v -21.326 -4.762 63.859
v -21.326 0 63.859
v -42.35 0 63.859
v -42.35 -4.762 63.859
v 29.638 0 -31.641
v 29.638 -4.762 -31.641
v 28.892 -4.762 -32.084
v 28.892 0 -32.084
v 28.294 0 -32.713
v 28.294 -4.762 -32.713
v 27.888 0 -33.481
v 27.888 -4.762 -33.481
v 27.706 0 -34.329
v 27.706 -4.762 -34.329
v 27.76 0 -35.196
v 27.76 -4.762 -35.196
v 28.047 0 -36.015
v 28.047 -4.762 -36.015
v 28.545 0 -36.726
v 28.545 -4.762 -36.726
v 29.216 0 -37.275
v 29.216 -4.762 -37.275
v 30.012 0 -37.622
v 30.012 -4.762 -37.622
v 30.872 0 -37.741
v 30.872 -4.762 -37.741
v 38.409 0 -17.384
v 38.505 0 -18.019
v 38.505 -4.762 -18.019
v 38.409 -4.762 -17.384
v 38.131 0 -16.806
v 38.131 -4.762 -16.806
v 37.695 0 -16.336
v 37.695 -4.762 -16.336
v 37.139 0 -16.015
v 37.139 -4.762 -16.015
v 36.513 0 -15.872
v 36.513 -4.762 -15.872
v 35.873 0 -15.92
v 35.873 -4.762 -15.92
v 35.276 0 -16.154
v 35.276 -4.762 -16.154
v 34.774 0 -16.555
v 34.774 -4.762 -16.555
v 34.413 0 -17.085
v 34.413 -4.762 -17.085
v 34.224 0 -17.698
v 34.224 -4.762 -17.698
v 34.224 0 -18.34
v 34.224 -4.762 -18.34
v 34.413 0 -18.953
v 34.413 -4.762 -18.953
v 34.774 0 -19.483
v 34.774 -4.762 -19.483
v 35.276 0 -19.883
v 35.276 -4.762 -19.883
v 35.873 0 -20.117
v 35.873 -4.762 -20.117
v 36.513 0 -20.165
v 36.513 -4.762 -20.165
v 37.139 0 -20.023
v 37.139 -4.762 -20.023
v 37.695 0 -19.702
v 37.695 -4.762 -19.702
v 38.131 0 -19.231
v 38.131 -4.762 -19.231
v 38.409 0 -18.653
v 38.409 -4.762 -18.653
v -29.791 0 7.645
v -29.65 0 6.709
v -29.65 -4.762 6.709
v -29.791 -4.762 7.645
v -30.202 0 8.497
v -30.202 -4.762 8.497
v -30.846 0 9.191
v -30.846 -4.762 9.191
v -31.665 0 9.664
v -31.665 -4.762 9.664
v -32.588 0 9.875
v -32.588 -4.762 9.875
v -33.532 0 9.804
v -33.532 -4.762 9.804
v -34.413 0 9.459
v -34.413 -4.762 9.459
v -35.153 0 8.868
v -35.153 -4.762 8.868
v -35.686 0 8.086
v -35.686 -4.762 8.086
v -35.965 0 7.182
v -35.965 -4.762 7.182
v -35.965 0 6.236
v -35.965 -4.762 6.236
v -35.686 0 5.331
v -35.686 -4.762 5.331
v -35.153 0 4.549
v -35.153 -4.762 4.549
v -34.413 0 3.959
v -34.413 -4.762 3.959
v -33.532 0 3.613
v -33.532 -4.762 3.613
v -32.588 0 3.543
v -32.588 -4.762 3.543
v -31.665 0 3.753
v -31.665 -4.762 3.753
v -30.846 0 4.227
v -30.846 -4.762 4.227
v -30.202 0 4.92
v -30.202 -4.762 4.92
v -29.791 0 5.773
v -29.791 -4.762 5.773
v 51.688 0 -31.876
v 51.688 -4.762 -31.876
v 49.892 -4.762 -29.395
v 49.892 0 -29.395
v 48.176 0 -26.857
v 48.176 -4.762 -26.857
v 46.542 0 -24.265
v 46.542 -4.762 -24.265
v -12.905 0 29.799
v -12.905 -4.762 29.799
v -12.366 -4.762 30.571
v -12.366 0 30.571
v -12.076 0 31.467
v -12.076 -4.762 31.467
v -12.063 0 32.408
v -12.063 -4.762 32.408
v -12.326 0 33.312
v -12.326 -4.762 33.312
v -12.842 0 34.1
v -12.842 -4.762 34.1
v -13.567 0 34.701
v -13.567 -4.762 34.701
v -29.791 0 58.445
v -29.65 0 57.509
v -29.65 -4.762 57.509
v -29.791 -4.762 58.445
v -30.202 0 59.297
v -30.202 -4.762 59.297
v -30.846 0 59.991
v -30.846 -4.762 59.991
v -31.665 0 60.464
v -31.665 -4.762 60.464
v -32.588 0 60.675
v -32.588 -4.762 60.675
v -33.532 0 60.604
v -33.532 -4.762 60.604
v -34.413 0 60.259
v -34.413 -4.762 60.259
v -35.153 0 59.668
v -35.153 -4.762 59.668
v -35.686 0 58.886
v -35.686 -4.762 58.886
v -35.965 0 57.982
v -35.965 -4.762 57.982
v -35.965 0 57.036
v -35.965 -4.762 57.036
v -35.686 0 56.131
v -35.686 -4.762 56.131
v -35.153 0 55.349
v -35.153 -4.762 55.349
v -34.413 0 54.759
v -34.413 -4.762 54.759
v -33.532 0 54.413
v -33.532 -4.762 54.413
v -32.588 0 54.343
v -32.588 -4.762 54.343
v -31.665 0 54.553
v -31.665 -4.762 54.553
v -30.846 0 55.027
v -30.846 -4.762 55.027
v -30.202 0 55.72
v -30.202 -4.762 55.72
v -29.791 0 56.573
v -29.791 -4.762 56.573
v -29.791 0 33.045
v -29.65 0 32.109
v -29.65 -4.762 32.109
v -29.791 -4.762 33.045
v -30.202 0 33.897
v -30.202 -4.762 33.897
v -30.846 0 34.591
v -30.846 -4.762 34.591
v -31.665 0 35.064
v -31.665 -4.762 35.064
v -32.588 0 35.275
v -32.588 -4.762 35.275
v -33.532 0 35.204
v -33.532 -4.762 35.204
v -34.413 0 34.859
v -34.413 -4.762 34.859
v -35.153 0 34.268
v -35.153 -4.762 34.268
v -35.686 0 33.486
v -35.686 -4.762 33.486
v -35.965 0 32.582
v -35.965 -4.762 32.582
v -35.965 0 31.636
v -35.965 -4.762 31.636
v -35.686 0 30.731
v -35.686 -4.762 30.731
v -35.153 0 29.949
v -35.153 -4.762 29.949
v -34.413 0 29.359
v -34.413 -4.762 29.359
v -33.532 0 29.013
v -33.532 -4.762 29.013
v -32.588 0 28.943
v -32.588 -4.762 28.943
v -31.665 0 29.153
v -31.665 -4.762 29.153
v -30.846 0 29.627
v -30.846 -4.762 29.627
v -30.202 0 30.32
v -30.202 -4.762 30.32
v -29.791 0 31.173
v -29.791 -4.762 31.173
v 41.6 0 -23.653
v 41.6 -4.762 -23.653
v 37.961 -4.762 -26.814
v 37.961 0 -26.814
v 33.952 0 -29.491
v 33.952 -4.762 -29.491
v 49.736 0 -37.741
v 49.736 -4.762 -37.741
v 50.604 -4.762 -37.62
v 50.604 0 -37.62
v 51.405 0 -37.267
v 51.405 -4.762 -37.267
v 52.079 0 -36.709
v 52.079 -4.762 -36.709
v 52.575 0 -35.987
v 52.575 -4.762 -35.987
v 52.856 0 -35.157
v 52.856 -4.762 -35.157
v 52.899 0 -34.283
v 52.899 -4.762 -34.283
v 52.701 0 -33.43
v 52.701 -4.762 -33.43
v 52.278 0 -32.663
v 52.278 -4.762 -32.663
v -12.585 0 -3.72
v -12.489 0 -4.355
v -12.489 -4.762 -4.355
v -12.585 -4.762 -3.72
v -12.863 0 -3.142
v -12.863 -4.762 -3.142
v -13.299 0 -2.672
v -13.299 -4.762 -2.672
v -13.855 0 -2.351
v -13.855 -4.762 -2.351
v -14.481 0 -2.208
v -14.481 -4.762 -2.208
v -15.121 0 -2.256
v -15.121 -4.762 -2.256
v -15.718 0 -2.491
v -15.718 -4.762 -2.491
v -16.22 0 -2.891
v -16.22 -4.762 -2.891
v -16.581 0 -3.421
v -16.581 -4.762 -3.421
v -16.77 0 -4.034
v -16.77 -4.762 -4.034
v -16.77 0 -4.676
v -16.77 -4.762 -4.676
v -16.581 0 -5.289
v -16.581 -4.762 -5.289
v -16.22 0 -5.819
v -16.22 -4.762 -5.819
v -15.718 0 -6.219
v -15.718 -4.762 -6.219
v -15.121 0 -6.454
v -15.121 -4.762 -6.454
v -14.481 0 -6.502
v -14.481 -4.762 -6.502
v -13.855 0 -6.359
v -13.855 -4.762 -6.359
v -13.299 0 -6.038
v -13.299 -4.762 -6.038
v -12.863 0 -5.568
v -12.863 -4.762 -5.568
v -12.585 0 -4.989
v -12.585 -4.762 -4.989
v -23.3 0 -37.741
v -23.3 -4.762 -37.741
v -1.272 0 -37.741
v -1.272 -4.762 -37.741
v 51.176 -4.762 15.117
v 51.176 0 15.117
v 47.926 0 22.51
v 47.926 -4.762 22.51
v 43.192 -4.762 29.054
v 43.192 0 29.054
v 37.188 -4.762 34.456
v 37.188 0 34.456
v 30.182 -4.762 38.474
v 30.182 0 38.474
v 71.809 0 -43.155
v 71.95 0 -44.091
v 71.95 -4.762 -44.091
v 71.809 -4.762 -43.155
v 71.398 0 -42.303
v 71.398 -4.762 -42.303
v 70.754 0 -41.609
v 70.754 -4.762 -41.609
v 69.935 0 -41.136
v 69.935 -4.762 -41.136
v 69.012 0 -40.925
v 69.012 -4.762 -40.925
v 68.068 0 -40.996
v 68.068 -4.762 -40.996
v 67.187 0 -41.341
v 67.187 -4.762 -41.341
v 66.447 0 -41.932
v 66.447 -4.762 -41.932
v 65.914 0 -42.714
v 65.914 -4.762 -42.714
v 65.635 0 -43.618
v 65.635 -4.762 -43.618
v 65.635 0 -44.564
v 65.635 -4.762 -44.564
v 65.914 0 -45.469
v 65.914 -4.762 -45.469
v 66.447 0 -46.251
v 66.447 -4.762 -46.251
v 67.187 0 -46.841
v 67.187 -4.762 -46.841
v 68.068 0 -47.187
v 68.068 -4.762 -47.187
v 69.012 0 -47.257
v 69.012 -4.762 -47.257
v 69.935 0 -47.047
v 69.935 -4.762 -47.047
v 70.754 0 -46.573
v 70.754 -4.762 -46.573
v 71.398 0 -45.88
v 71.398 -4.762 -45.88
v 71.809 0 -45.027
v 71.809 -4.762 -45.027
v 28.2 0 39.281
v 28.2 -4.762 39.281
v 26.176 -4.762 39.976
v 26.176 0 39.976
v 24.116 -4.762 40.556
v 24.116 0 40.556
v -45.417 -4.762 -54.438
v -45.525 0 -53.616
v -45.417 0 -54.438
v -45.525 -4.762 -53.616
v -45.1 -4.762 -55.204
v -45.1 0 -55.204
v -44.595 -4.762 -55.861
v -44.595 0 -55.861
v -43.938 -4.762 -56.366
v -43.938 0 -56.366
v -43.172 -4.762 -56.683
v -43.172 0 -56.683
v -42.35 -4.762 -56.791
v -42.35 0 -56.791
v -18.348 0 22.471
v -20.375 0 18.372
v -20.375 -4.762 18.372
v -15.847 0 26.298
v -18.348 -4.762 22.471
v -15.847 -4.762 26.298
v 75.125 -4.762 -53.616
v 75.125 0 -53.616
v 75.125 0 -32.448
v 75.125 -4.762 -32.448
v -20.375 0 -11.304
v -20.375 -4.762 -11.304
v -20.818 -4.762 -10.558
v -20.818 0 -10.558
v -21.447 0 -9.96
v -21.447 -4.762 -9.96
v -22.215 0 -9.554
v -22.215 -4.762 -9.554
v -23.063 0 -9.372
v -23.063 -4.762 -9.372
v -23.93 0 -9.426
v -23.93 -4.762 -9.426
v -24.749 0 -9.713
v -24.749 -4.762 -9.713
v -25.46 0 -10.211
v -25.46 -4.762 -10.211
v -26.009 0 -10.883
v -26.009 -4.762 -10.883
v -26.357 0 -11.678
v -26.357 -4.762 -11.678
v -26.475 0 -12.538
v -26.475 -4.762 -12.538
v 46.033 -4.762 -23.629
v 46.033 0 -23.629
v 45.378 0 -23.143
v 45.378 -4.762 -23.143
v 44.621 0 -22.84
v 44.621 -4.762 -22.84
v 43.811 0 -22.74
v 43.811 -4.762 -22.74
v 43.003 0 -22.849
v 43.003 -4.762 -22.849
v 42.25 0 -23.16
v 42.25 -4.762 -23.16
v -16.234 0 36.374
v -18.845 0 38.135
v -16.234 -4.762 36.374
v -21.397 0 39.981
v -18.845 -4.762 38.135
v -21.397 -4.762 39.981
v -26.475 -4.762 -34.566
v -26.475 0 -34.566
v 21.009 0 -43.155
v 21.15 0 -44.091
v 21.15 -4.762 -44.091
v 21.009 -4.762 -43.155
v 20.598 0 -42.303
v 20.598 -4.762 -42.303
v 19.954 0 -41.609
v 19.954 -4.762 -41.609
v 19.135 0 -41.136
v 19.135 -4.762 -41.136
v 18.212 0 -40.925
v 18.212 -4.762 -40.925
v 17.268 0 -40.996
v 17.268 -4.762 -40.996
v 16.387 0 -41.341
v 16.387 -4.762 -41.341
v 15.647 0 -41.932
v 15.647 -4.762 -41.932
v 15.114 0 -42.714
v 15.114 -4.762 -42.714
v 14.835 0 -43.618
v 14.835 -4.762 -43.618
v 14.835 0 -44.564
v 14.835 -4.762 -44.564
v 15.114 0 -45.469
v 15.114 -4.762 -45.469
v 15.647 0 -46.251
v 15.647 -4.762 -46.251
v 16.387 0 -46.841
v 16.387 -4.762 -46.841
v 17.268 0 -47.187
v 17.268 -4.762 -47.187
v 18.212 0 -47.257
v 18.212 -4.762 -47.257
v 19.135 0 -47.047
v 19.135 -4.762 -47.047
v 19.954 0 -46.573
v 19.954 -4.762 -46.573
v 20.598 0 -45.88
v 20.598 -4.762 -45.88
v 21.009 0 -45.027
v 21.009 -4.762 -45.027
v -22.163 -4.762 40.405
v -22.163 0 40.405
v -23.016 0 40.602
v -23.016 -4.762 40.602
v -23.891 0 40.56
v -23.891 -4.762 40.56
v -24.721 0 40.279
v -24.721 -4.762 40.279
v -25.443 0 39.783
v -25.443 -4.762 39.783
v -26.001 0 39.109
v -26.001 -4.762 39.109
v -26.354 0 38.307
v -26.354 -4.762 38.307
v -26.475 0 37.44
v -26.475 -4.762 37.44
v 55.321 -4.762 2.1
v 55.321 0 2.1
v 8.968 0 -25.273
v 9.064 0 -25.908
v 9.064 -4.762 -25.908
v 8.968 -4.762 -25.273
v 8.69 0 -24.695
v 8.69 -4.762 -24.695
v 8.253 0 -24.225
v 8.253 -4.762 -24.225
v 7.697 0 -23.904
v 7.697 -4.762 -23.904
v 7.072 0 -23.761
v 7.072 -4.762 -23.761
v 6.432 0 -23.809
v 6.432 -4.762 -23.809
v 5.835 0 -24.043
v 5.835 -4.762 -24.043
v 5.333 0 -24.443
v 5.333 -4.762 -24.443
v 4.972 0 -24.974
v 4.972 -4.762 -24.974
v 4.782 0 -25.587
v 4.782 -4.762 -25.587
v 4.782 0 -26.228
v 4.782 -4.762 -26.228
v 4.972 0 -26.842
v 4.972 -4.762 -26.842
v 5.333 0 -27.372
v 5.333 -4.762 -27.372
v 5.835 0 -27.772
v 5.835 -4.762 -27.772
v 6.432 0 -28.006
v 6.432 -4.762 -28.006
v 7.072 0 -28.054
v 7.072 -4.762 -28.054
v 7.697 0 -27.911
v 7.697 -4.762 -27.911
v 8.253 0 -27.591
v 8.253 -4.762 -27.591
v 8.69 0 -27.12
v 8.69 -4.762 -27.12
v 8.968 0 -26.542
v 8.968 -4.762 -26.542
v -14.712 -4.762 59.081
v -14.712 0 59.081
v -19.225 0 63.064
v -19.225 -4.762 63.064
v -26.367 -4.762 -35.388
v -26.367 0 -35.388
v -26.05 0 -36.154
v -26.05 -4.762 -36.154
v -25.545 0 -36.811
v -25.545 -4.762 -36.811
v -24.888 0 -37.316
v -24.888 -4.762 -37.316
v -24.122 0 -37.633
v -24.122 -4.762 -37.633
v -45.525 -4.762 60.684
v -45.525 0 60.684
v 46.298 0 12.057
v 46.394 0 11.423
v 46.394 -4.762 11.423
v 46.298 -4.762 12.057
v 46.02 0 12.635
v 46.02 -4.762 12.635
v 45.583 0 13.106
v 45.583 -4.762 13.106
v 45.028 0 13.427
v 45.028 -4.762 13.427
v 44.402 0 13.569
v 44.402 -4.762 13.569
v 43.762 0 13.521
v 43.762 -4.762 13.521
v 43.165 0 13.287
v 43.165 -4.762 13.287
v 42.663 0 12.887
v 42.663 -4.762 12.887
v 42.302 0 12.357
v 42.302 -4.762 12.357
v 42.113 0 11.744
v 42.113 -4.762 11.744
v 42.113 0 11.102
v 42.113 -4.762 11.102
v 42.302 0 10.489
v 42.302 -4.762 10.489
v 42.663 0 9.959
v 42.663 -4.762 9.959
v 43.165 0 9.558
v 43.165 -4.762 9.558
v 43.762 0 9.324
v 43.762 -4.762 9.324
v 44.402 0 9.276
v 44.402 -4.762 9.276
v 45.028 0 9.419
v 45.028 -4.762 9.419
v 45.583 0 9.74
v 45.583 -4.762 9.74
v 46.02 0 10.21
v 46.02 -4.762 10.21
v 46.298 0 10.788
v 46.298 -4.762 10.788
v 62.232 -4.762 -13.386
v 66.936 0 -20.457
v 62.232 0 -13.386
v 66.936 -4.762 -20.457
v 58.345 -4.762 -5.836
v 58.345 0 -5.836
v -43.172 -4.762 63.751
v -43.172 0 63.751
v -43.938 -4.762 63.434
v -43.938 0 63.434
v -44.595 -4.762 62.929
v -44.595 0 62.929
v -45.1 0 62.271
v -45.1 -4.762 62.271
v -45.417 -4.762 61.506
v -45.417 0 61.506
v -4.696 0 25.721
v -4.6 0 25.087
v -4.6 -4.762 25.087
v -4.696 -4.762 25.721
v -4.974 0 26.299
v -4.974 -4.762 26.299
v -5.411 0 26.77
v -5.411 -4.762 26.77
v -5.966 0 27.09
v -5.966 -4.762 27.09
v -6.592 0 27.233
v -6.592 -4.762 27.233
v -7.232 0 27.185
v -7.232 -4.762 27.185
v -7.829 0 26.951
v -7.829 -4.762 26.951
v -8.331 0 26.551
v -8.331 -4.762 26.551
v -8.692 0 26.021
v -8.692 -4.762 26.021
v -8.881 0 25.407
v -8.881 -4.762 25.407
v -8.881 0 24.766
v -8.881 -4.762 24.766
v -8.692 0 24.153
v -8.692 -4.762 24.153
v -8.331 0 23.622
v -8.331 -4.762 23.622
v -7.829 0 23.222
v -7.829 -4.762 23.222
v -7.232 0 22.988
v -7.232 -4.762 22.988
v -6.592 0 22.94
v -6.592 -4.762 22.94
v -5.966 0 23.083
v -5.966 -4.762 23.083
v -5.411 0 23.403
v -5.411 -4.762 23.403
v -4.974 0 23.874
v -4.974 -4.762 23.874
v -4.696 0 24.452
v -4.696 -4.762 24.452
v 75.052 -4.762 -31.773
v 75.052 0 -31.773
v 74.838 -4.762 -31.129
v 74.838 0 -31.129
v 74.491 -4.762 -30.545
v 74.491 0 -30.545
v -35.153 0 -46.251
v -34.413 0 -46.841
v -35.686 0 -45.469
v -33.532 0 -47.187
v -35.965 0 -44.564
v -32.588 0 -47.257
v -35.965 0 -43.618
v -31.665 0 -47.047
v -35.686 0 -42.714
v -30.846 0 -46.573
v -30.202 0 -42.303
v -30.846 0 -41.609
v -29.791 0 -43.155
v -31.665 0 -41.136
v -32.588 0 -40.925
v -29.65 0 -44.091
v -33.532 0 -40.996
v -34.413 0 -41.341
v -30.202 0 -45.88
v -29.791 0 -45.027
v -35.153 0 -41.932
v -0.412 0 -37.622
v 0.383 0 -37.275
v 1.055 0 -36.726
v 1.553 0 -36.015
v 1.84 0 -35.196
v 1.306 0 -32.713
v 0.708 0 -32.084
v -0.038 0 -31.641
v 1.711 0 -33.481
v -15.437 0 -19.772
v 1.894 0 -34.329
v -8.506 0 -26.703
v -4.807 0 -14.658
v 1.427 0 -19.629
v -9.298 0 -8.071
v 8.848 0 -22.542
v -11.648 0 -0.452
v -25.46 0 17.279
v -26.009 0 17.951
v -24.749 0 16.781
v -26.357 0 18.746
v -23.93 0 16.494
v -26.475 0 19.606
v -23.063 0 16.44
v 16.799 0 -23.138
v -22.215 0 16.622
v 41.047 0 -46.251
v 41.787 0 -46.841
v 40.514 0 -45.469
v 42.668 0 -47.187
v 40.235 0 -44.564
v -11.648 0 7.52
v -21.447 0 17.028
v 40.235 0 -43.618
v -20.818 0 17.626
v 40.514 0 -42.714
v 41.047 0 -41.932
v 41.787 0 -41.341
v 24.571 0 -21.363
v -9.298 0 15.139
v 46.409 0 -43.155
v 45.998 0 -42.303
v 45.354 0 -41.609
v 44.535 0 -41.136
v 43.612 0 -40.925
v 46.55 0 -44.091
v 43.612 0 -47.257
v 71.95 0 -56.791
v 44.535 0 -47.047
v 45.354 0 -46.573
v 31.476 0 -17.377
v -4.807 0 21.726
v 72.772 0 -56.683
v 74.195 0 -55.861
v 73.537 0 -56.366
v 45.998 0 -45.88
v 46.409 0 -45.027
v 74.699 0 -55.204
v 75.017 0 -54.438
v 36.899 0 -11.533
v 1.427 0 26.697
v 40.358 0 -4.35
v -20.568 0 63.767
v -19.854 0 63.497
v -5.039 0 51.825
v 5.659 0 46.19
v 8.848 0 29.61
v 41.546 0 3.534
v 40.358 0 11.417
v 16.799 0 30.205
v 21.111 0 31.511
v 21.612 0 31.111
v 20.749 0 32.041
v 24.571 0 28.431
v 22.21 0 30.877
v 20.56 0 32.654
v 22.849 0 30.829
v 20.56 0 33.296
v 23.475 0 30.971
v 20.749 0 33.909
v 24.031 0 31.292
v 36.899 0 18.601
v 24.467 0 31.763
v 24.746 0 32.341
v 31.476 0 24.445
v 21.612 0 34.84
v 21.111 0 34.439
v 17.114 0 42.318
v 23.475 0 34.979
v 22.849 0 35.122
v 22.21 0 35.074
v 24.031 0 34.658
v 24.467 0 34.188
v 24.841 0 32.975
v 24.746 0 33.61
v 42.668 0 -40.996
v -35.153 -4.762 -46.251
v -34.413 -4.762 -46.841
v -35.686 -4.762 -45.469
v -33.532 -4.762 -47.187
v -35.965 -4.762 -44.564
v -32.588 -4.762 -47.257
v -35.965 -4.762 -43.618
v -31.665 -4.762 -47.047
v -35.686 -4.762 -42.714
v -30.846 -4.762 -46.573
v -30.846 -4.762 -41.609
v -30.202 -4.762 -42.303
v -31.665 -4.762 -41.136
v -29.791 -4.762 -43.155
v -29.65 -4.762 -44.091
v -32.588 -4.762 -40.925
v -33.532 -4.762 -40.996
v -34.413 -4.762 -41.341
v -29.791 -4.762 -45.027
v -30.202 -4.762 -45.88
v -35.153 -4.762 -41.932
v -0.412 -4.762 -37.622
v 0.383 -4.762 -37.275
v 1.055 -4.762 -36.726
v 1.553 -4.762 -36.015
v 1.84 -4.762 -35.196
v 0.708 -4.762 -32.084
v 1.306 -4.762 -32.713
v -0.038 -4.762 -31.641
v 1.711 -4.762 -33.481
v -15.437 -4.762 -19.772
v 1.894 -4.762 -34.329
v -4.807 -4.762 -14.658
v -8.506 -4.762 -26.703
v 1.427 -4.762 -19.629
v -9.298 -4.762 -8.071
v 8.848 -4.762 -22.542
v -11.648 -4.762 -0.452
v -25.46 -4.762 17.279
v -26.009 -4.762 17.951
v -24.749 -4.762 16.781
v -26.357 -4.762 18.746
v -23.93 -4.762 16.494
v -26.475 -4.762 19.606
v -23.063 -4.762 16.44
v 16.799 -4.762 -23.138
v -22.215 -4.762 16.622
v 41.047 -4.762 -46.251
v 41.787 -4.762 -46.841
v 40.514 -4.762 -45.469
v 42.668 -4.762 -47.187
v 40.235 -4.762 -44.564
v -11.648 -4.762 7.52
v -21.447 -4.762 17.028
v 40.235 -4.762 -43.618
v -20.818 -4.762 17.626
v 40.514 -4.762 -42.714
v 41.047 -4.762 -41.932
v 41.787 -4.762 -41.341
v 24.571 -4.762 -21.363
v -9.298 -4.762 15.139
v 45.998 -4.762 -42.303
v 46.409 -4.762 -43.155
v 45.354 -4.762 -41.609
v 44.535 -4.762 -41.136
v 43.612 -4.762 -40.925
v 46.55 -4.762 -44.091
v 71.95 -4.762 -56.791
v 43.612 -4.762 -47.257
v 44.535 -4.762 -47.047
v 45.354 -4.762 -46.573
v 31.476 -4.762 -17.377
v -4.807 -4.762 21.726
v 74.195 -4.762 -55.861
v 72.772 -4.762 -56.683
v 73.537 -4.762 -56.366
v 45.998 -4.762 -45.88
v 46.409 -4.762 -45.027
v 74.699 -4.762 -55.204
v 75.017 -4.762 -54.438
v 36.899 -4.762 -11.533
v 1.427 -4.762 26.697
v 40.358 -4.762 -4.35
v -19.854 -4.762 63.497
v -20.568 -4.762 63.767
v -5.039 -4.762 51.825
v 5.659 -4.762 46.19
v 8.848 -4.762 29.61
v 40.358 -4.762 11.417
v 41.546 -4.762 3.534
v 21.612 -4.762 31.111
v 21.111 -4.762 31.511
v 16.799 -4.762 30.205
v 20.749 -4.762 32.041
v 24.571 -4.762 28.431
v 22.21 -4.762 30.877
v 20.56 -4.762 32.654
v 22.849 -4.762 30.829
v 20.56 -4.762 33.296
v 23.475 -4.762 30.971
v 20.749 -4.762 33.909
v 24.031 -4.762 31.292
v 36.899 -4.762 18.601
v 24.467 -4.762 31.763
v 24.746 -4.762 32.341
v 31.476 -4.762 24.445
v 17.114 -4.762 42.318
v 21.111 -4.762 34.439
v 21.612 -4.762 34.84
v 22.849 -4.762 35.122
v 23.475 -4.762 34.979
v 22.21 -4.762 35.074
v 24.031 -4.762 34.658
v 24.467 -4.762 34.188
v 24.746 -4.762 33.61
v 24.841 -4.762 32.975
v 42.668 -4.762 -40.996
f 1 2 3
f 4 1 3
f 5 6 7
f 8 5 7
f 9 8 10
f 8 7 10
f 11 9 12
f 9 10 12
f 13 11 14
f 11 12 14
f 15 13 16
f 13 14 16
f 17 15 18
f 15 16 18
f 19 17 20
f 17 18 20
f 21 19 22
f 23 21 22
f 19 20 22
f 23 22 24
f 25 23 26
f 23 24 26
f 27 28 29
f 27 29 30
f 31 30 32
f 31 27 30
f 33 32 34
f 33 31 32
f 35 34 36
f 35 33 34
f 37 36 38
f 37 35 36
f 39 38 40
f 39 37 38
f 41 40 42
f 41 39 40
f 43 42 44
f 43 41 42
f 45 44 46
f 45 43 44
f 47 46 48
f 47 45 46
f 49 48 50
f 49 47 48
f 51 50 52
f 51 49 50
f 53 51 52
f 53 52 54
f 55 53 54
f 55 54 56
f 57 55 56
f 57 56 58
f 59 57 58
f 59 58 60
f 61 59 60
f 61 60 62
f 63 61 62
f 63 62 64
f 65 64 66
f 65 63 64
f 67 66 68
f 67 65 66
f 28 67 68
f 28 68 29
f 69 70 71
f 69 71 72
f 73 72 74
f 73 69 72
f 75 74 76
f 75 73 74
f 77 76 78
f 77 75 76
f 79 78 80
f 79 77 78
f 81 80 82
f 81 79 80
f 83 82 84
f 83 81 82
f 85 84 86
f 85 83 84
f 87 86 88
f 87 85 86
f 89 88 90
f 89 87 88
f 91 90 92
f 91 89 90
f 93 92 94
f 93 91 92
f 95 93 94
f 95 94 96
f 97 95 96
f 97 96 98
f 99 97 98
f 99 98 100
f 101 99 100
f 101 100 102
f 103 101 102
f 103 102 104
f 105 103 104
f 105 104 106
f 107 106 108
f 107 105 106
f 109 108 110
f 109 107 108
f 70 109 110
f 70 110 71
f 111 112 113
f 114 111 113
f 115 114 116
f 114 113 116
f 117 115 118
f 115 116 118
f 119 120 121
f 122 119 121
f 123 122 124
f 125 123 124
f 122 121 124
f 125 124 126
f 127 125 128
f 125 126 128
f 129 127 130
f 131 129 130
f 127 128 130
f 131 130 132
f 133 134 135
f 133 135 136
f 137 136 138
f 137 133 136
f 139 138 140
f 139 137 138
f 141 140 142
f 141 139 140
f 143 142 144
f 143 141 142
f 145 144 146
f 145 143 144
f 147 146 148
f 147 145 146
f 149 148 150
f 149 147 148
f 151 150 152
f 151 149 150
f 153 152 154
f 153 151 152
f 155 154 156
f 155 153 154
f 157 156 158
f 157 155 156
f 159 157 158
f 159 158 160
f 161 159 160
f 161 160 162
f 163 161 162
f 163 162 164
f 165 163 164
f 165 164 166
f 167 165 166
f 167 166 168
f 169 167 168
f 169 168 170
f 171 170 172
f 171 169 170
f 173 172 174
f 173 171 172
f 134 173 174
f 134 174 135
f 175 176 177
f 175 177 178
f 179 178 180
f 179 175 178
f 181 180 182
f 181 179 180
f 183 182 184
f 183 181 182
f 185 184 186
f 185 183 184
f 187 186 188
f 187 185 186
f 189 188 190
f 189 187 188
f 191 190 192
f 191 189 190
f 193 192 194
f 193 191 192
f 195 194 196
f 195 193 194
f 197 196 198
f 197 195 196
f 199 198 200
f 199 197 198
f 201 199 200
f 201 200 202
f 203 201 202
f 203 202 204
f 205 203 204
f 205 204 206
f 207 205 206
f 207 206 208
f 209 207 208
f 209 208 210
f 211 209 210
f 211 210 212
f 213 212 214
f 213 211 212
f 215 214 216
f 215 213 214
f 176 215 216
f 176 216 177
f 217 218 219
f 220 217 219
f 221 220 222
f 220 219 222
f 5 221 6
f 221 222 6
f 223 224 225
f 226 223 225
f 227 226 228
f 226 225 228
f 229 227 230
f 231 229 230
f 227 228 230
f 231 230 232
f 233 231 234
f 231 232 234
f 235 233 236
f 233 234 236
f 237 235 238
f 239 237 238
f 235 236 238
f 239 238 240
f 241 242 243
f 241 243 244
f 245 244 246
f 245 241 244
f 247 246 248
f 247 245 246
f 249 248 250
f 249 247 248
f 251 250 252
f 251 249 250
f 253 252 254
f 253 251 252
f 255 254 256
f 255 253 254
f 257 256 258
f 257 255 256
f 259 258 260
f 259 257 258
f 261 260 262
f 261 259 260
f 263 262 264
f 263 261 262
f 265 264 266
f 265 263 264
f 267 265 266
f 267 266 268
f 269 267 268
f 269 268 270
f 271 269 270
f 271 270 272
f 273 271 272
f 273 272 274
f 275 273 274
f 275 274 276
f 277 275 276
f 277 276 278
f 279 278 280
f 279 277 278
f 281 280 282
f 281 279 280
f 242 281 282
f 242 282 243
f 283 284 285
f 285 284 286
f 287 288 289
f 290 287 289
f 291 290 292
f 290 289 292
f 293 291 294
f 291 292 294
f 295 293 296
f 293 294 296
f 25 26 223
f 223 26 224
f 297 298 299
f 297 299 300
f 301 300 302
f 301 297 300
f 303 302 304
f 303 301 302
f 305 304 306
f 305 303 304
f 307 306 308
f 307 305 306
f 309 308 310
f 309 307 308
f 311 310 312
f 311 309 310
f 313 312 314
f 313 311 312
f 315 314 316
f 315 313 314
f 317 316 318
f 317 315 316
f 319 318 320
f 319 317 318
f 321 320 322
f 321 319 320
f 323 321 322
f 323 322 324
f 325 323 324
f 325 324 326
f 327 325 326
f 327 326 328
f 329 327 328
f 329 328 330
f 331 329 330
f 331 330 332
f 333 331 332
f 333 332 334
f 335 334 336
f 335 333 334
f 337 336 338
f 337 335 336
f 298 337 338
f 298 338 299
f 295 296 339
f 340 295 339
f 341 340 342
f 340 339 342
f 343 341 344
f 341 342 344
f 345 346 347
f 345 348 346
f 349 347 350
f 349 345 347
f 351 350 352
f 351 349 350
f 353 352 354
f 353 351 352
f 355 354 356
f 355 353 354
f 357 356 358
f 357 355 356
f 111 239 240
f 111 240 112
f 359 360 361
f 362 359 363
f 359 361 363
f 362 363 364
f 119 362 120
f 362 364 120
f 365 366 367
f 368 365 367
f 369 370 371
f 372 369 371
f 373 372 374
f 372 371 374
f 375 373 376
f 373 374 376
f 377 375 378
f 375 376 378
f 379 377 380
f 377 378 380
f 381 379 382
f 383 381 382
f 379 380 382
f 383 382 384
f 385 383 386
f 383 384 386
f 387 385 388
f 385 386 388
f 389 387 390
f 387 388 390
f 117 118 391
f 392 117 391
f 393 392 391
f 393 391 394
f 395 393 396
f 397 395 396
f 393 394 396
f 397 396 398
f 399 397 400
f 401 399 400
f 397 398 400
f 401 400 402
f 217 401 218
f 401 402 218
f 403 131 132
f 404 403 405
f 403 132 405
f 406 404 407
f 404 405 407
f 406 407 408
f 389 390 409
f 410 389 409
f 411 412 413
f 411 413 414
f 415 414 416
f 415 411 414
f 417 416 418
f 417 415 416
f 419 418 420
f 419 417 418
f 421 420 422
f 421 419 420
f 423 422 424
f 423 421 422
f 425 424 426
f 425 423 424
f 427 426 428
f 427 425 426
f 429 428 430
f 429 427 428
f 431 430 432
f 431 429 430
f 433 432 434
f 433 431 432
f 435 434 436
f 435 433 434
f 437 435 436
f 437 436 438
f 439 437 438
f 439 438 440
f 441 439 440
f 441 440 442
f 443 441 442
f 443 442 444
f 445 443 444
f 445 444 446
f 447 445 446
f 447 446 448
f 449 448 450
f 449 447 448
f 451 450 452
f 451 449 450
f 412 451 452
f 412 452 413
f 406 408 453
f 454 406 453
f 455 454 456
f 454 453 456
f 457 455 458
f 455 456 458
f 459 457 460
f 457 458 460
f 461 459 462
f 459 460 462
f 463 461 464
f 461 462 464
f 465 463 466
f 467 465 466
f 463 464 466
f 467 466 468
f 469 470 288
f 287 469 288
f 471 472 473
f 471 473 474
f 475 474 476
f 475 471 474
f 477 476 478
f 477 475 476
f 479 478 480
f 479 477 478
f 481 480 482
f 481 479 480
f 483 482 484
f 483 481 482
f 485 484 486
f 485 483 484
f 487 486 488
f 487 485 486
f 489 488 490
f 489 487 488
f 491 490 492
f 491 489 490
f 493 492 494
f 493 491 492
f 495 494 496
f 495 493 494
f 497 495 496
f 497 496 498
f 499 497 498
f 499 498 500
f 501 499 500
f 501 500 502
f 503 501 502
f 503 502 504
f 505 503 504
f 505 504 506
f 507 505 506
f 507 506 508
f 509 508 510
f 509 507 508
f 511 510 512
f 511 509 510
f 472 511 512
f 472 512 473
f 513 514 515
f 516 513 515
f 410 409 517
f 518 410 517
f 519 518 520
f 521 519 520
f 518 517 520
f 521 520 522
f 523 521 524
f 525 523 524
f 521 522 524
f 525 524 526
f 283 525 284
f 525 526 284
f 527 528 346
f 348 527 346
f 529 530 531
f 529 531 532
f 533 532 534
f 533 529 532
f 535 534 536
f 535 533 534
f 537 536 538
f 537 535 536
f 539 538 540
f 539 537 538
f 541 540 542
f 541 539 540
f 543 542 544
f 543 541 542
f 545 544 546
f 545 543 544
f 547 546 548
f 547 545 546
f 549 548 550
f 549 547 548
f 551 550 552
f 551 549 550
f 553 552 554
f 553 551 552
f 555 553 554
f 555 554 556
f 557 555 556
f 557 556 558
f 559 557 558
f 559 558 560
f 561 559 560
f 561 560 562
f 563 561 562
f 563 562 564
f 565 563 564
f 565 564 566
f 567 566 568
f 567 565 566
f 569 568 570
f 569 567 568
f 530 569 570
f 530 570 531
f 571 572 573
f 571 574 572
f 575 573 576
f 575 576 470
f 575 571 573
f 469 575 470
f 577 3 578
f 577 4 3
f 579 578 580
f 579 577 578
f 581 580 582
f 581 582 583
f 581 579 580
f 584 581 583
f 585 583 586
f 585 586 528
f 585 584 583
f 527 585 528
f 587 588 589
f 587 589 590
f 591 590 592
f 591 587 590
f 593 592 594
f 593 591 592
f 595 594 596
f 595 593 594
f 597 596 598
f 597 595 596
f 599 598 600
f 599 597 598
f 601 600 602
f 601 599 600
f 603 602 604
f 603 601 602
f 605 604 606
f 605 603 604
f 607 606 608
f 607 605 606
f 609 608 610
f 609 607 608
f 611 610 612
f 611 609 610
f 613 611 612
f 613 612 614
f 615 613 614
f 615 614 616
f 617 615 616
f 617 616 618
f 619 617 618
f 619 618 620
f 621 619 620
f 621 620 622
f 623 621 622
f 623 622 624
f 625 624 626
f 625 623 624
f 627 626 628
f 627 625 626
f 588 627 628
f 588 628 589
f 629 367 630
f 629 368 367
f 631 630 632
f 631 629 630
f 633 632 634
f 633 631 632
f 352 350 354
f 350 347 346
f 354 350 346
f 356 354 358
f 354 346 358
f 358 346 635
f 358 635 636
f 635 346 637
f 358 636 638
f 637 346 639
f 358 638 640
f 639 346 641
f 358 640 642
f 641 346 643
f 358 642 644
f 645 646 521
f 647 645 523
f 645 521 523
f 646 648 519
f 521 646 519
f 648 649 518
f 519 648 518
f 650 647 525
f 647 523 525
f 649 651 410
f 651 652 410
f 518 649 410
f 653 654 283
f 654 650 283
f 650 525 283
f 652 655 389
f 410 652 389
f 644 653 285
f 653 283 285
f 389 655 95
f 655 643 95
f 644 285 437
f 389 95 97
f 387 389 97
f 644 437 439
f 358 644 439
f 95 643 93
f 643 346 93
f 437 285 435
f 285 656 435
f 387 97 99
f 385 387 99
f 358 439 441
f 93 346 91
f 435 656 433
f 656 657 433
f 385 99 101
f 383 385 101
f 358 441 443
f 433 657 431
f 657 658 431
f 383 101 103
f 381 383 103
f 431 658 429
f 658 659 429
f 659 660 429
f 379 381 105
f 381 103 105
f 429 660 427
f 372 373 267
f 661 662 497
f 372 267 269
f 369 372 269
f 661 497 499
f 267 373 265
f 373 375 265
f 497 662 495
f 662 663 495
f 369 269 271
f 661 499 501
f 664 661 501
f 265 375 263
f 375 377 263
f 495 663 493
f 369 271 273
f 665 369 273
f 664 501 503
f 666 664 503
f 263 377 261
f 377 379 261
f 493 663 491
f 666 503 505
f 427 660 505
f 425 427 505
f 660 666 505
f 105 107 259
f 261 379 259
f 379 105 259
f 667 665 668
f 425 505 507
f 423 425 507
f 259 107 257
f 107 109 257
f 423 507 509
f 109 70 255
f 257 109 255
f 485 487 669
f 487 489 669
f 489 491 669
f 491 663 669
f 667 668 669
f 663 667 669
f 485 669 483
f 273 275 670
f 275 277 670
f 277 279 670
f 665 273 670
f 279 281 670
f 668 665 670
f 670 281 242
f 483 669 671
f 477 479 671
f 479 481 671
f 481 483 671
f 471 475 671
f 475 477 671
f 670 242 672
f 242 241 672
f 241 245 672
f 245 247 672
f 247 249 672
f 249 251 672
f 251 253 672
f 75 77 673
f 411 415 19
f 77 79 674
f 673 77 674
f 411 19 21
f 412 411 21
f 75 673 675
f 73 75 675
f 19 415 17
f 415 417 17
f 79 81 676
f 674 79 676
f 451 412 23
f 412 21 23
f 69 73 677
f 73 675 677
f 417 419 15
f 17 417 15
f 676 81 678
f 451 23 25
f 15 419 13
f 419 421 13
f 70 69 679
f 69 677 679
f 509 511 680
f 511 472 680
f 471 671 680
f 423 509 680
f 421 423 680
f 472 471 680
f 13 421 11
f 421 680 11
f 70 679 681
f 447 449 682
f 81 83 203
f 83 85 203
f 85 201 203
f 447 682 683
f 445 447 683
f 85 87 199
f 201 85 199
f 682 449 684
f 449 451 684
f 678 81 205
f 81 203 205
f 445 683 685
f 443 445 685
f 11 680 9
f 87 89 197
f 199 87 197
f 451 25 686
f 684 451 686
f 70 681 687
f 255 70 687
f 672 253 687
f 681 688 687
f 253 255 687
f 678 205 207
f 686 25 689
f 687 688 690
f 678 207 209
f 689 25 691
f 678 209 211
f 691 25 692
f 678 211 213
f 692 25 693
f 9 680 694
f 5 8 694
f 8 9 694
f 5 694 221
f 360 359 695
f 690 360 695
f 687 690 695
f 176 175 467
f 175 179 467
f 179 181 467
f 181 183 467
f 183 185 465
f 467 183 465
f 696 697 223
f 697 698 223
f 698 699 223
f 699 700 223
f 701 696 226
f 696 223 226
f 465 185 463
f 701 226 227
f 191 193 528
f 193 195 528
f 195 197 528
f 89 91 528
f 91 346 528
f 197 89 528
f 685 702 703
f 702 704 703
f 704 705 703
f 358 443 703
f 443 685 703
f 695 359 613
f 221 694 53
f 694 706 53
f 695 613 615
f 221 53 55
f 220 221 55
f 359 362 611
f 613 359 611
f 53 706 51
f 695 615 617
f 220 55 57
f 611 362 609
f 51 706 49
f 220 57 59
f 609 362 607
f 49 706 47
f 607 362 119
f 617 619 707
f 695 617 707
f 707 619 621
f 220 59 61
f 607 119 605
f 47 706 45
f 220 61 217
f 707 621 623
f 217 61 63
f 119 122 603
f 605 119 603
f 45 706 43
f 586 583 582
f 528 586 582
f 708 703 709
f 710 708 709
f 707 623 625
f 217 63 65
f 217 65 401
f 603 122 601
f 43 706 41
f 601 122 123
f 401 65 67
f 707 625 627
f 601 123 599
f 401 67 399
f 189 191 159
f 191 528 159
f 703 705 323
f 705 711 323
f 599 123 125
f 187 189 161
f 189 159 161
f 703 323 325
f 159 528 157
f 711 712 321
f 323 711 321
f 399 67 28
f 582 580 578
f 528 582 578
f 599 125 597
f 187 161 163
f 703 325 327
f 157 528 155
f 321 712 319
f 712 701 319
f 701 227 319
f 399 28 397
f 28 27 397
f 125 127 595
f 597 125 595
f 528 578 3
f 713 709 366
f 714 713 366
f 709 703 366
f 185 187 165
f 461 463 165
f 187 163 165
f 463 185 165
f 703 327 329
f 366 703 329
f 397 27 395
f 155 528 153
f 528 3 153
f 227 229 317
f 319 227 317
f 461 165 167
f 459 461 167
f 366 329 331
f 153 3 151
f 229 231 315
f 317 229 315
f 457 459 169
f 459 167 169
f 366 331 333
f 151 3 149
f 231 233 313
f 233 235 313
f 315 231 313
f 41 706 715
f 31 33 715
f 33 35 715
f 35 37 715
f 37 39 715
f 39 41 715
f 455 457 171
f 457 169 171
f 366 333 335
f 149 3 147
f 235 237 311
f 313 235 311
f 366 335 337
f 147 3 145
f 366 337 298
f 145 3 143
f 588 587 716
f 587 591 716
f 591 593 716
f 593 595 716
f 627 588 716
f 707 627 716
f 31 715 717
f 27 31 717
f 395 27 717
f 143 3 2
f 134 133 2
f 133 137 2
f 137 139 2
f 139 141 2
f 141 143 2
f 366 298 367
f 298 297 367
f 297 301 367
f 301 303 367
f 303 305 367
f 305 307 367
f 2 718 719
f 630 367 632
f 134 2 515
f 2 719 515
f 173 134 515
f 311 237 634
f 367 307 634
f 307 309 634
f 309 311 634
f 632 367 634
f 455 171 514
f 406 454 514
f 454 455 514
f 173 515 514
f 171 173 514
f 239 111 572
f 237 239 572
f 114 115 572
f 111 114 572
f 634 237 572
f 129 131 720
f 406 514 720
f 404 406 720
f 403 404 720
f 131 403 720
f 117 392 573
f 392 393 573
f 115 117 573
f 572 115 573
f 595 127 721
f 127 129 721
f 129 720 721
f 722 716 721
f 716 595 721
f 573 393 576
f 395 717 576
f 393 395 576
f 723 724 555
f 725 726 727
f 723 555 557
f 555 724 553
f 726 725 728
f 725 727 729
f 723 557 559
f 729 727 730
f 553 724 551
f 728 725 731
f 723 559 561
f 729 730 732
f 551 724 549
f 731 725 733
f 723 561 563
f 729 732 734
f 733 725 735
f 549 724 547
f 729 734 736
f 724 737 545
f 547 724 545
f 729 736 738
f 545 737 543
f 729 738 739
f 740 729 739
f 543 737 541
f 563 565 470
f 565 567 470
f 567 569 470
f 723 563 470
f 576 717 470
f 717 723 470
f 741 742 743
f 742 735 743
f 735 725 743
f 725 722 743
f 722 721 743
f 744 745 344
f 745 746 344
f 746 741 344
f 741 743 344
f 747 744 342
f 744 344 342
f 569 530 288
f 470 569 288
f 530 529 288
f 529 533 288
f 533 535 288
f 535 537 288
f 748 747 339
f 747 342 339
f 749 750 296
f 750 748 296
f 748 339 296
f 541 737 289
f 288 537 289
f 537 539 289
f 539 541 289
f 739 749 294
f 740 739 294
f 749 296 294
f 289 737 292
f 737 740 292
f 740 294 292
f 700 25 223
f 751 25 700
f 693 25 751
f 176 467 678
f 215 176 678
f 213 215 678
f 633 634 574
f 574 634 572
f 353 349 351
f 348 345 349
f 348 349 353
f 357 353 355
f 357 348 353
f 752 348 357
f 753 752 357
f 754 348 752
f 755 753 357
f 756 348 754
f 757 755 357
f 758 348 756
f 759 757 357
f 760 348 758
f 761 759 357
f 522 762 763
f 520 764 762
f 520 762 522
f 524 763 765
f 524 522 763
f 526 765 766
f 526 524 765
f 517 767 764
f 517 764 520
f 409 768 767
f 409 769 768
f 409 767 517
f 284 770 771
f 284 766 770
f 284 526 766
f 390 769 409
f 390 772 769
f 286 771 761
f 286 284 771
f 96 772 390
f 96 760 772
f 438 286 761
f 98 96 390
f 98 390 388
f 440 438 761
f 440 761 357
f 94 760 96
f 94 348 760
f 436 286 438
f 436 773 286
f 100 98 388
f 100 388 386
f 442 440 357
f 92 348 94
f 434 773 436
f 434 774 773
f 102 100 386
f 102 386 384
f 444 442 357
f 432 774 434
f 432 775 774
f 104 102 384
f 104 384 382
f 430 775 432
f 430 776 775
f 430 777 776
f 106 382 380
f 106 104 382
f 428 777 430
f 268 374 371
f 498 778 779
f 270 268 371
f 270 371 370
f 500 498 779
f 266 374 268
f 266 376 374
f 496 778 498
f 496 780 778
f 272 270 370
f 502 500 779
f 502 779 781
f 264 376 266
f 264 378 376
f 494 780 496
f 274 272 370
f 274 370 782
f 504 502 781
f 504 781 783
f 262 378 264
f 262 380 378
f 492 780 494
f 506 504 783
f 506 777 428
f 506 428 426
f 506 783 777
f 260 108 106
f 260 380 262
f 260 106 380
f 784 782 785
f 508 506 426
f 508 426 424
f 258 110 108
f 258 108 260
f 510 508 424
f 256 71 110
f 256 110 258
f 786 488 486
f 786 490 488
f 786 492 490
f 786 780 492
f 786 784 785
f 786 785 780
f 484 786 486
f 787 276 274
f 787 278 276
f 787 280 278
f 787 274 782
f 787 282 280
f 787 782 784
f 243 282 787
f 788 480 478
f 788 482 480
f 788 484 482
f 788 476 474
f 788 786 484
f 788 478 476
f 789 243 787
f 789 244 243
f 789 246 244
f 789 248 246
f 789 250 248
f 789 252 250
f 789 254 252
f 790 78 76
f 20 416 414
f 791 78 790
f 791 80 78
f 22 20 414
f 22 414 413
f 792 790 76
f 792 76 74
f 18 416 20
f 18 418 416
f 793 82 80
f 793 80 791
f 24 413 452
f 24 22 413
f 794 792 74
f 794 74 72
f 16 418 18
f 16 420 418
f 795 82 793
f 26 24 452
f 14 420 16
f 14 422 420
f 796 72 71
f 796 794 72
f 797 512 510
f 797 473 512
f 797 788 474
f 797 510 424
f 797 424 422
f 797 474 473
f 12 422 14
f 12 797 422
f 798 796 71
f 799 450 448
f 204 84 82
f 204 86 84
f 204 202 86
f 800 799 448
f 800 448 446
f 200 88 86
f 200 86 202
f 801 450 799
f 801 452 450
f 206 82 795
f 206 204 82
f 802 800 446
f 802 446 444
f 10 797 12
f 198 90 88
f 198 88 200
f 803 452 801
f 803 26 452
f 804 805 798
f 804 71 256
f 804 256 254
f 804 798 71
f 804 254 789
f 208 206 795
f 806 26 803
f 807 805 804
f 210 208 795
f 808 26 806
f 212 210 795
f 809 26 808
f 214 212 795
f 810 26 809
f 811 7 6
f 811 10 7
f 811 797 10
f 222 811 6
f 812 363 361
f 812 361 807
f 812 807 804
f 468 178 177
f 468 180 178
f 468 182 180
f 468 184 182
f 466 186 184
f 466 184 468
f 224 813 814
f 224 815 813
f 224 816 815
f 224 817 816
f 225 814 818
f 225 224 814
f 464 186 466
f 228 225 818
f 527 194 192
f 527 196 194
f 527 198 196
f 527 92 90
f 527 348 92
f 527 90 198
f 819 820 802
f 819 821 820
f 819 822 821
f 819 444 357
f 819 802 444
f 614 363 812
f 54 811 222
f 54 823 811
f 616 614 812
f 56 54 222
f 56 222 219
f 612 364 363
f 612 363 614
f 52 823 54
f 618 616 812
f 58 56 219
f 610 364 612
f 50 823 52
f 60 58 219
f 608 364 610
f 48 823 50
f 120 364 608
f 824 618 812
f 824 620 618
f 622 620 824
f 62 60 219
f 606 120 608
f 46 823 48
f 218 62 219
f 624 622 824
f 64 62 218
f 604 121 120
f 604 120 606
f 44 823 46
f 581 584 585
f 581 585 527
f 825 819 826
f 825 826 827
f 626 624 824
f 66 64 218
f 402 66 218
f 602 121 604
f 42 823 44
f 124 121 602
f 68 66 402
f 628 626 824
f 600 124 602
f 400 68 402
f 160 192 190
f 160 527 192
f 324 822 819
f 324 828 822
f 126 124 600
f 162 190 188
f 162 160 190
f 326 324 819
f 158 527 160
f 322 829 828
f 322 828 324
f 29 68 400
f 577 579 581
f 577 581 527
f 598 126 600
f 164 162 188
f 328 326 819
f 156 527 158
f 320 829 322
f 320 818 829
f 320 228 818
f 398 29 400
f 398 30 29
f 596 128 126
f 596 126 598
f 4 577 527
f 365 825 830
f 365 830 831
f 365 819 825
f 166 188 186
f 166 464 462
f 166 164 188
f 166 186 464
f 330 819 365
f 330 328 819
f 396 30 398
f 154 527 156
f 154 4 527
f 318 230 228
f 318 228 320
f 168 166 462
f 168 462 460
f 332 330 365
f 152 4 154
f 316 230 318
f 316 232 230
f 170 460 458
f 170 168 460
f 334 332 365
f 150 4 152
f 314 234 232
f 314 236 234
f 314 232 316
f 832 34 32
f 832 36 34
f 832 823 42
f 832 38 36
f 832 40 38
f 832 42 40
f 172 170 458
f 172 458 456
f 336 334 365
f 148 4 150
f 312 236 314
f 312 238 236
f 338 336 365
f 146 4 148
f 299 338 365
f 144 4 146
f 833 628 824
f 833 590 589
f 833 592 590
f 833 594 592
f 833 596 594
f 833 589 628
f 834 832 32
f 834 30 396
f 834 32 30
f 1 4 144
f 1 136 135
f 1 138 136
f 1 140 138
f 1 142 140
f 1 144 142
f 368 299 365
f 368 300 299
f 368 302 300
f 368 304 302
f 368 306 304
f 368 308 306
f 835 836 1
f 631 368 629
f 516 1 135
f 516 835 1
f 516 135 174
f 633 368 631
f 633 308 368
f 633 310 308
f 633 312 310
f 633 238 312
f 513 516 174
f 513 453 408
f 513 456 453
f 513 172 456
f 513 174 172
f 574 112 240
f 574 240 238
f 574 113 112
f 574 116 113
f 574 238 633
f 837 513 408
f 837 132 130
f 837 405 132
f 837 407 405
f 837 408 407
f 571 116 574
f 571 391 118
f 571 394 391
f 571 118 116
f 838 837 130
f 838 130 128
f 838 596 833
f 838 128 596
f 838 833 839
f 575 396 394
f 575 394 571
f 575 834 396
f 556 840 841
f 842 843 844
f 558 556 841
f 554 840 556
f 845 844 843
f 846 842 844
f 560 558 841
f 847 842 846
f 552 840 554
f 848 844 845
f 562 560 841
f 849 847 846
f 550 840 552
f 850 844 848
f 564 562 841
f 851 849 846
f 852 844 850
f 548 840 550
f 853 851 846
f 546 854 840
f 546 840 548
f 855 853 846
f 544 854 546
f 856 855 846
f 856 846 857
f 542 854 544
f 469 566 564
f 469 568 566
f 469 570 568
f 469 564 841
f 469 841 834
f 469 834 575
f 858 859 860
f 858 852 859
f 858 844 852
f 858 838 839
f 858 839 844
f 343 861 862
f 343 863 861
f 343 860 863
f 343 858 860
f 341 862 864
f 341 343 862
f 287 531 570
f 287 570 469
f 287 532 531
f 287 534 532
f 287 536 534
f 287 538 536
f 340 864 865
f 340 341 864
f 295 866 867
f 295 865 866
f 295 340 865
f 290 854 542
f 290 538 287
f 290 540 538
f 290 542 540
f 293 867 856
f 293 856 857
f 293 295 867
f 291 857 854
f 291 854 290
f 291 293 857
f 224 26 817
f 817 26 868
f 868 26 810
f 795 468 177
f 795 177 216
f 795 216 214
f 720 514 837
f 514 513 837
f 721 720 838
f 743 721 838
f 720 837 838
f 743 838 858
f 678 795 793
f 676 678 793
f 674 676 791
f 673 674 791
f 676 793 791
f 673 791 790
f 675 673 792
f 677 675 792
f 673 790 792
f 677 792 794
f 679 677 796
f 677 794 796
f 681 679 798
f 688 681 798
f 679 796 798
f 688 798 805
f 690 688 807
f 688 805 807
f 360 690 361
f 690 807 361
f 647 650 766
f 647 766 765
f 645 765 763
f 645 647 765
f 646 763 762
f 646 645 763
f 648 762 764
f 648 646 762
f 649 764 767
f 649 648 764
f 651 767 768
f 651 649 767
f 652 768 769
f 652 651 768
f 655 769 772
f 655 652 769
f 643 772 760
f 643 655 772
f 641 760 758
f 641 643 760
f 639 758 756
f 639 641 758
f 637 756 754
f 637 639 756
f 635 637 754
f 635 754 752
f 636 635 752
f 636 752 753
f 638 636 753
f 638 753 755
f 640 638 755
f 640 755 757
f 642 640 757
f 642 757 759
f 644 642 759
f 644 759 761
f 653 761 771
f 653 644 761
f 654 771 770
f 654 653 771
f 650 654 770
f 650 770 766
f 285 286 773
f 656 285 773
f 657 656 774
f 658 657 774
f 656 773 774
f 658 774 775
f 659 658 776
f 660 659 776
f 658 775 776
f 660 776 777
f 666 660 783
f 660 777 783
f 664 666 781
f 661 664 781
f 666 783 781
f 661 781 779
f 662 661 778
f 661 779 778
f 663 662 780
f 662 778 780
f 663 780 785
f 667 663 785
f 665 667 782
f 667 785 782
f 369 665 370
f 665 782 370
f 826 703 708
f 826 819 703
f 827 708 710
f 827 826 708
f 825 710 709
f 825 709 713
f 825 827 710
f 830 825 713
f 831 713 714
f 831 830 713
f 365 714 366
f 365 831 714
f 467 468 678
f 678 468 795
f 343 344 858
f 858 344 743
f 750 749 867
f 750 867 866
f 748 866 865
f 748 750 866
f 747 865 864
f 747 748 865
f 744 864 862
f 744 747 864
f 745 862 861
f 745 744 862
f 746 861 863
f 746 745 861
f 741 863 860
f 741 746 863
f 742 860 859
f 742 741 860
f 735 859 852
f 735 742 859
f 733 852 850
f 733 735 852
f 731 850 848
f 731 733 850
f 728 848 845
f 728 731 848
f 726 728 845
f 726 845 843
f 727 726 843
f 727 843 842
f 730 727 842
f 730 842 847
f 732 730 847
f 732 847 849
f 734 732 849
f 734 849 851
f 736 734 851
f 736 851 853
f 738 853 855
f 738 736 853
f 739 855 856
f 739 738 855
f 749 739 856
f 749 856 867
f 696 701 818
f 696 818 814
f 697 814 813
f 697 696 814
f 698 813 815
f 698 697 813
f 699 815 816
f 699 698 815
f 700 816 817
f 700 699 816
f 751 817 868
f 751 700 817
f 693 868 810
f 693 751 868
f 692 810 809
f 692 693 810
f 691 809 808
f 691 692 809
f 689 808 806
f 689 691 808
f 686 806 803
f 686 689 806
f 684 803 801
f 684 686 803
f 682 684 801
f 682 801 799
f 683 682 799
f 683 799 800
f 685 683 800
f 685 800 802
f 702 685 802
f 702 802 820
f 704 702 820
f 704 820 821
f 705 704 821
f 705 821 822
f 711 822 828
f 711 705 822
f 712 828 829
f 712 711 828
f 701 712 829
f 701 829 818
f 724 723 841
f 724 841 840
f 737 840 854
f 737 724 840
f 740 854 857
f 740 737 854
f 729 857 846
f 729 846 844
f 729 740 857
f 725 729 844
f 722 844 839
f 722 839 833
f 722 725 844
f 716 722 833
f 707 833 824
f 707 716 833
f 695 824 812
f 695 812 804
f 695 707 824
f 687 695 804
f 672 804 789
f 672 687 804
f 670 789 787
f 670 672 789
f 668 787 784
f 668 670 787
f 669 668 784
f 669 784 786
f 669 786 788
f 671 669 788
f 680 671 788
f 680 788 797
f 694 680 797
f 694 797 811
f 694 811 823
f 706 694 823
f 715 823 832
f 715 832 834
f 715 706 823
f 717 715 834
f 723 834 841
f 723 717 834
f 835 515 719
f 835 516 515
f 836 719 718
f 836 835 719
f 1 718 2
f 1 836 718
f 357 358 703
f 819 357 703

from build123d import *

# Parameters (mm, degrees)
F0_R     = 3.175
F0_R_2   = 2.15265
F0_R_3   = 26.7462
F1_DEPTH = 4.7625
F2_R     = 76.2
F3_R     = 3.175
F5_DEPTH = 4.7635


with BuildPart() as f1:
    # F0 (on Front) → F1 (new body)
    with BuildSketch(Plane.XZ):
        with BuildLine():
            Line((-20.125207, 63.858887), (-45.525207, 63.858887))
            Line((-45.525207, 63.858887), (-45.525207, -56.791113))
            Line((-45.525207, -56.791113), (75.124793, -56.791113))
            Line((75.124793, -56.791113), (75.124793, -31.391113))
            Line((75.124793, -31.391113), (59.224484, -10.158949))
            Line((59.224484, -10.158949), (51.176471, 15.116615))
            ThreePointArc((51.176471, 15.116615), (43.192477, 29.054031), (30.182356, 38.473821))
            ThreePointArc((30.182356, 38.473821), (27.19297, 39.642493), (24.115979, 40.55592))
            Line((24.115979, 40.55592), (-0.834672, 46.834476))
            Line((-0.834672, 46.834476), (-20.125207, 63.858887))
        make_face()
        with Locations((-32.825207, -44.091113)):
            Circle(F0_R, mode=Mode.SUBTRACT)
        with Locations((6.910989, -25.907532)):
            Circle(F0_R_2, mode=Mode.SUBTRACT)
        with Locations((-14.641626, -4.354918)):
            Circle(F0_R_2, mode=Mode.SUBTRACT)
        with Locations((17.974793, -44.091113)):
            Circle(F0_R, mode=Mode.SUBTRACT)
        with Locations((43.374793, -44.091113)):
            Circle(F0_R, mode=Mode.SUBTRACT)
        with Locations((68.774793, -44.091113)):
            Circle(F0_R, mode=Mode.SUBTRACT)
        with Locations((36.352408, -18.018728)):
            Circle(F0_R_2, mode=Mode.SUBTRACT)
        with Locations((-32.825207, 6.708887)):
            Circle(F0_R, mode=Mode.SUBTRACT)
        with Locations((-32.825207, 32.108887)):
            Circle(F0_R, mode=Mode.SUBTRACT)
        with Locations((-6.752821, 25.086501)):
            Circle(F0_R_2, mode=Mode.SUBTRACT)
        with Locations((-32.825207, 57.508887)):
            Circle(F0_R, mode=Mode.SUBTRACT)
        with Locations((14.799793, 3.533887)):
            Circle(F0_R_3, mode=Mode.SUBTRACT)
        with Locations((44.241213, 11.422691)):
            Circle(F0_R_2, mode=Mode.SUBTRACT)
        with Locations((22.688598, 32.975306)):
            Circle(F0_R_2, mode=Mode.SUBTRACT)
    extrude(amount=F1_DEPTH)

    # F2
    f2_edges = [f1.edges().sort_by_distance(p)[0] for p in [
        (-0.834672, -2.38125, 46.834476),
        (59.224484, -2.38125, -10.158949),
    ]]
    fillet(f2_edges, radius=F2_R)

    # F3
    f3_edges = [f1.edges().sort_by_distance(p)[0] for p in [
        (-45.525207, -2.38125, 63.858887),
        (-20.125207, -2.38125, 63.858887),
        (-45.525207, -2.38125, -56.791113),
        (75.124793, -2.38125, -31.391113),
        (75.124793, -2.38125, -56.791113),
    ]]
    fillet(f3_edges, radius=F3_R)

    # F4 (on face) → F5 (cut, through all)
    with BuildSketch(Plane.XZ.offset(4.7625)):
        with BuildLine():
            ThreePointArc((-12.90503, 29.799168), (-12.06269, 32.408274), (-13.566624, 34.700687))
            ThreePointArc((-13.566624, 34.700687), (-17.547135, 37.243821), (-21.396672, 39.981165))
            ThreePointArc((-21.396672, 39.981165), (-24.720929, 40.279463), (-26.475207, 37.440066))
            Line((-26.475207, 37.440066), (-26.475207, 19.605966))
            ThreePointArc((-26.475207, 19.605966), (-23.929722, 16.494), (-20.374838, 18.371931))
            ThreePointArc((-20.374838, 18.371931), (-17.154892, 24.422169), (-12.90503, 29.799168))
        make_face()
        with BuildLine():
            ThreePointArc((-26.475207, -34.566113), (-25.545271, -36.811177), (-23.300207, -37.741113))
            Line((-23.300207, -37.741113), (-1.272286, -37.741113))
            ThreePointArc((-1.272286, -37.741113), (1.83968, -35.195629), (-0.038251, -31.640745))
            ThreePointArc((-0.038251, -31.640745), (-12.194856, -23.460763), (-20.374838, -11.304157))
            ThreePointArc((-20.374838, -11.304157), (-23.929722, -9.426226), (-26.475207, -12.538193))
            Line((-26.475207, -12.538193), (-26.475207, -34.566113))
        make_face()
        with BuildLine():
            Line((52.277549, -32.662938), (51.688182, -31.875938))
            ThreePointArc((51.688182, -31.875938), (49.023348, -28.132604), (46.542146, -24.265108))
            ThreePointArc((46.542146, -24.265108), (44.219215, -22.76363), (41.600324, -23.653496))
            ThreePointArc((41.600324, -23.653496), (35.998656, -28.215609), (29.637837, -31.640745))
            ThreePointArc((29.637837, -31.640745), (27.759907, -35.195629), (30.871873, -37.741113))
            Line((30.871873, -37.741113), (49.736182, -37.741113))
            ThreePointArc((49.736182, -37.741113), (52.575478, -35.987036), (52.277549, -32.662938))
        make_face()
    extrude(amount=-F5_DEPTH, mode=Mode.SUBTRACT)


solid = f1.part
